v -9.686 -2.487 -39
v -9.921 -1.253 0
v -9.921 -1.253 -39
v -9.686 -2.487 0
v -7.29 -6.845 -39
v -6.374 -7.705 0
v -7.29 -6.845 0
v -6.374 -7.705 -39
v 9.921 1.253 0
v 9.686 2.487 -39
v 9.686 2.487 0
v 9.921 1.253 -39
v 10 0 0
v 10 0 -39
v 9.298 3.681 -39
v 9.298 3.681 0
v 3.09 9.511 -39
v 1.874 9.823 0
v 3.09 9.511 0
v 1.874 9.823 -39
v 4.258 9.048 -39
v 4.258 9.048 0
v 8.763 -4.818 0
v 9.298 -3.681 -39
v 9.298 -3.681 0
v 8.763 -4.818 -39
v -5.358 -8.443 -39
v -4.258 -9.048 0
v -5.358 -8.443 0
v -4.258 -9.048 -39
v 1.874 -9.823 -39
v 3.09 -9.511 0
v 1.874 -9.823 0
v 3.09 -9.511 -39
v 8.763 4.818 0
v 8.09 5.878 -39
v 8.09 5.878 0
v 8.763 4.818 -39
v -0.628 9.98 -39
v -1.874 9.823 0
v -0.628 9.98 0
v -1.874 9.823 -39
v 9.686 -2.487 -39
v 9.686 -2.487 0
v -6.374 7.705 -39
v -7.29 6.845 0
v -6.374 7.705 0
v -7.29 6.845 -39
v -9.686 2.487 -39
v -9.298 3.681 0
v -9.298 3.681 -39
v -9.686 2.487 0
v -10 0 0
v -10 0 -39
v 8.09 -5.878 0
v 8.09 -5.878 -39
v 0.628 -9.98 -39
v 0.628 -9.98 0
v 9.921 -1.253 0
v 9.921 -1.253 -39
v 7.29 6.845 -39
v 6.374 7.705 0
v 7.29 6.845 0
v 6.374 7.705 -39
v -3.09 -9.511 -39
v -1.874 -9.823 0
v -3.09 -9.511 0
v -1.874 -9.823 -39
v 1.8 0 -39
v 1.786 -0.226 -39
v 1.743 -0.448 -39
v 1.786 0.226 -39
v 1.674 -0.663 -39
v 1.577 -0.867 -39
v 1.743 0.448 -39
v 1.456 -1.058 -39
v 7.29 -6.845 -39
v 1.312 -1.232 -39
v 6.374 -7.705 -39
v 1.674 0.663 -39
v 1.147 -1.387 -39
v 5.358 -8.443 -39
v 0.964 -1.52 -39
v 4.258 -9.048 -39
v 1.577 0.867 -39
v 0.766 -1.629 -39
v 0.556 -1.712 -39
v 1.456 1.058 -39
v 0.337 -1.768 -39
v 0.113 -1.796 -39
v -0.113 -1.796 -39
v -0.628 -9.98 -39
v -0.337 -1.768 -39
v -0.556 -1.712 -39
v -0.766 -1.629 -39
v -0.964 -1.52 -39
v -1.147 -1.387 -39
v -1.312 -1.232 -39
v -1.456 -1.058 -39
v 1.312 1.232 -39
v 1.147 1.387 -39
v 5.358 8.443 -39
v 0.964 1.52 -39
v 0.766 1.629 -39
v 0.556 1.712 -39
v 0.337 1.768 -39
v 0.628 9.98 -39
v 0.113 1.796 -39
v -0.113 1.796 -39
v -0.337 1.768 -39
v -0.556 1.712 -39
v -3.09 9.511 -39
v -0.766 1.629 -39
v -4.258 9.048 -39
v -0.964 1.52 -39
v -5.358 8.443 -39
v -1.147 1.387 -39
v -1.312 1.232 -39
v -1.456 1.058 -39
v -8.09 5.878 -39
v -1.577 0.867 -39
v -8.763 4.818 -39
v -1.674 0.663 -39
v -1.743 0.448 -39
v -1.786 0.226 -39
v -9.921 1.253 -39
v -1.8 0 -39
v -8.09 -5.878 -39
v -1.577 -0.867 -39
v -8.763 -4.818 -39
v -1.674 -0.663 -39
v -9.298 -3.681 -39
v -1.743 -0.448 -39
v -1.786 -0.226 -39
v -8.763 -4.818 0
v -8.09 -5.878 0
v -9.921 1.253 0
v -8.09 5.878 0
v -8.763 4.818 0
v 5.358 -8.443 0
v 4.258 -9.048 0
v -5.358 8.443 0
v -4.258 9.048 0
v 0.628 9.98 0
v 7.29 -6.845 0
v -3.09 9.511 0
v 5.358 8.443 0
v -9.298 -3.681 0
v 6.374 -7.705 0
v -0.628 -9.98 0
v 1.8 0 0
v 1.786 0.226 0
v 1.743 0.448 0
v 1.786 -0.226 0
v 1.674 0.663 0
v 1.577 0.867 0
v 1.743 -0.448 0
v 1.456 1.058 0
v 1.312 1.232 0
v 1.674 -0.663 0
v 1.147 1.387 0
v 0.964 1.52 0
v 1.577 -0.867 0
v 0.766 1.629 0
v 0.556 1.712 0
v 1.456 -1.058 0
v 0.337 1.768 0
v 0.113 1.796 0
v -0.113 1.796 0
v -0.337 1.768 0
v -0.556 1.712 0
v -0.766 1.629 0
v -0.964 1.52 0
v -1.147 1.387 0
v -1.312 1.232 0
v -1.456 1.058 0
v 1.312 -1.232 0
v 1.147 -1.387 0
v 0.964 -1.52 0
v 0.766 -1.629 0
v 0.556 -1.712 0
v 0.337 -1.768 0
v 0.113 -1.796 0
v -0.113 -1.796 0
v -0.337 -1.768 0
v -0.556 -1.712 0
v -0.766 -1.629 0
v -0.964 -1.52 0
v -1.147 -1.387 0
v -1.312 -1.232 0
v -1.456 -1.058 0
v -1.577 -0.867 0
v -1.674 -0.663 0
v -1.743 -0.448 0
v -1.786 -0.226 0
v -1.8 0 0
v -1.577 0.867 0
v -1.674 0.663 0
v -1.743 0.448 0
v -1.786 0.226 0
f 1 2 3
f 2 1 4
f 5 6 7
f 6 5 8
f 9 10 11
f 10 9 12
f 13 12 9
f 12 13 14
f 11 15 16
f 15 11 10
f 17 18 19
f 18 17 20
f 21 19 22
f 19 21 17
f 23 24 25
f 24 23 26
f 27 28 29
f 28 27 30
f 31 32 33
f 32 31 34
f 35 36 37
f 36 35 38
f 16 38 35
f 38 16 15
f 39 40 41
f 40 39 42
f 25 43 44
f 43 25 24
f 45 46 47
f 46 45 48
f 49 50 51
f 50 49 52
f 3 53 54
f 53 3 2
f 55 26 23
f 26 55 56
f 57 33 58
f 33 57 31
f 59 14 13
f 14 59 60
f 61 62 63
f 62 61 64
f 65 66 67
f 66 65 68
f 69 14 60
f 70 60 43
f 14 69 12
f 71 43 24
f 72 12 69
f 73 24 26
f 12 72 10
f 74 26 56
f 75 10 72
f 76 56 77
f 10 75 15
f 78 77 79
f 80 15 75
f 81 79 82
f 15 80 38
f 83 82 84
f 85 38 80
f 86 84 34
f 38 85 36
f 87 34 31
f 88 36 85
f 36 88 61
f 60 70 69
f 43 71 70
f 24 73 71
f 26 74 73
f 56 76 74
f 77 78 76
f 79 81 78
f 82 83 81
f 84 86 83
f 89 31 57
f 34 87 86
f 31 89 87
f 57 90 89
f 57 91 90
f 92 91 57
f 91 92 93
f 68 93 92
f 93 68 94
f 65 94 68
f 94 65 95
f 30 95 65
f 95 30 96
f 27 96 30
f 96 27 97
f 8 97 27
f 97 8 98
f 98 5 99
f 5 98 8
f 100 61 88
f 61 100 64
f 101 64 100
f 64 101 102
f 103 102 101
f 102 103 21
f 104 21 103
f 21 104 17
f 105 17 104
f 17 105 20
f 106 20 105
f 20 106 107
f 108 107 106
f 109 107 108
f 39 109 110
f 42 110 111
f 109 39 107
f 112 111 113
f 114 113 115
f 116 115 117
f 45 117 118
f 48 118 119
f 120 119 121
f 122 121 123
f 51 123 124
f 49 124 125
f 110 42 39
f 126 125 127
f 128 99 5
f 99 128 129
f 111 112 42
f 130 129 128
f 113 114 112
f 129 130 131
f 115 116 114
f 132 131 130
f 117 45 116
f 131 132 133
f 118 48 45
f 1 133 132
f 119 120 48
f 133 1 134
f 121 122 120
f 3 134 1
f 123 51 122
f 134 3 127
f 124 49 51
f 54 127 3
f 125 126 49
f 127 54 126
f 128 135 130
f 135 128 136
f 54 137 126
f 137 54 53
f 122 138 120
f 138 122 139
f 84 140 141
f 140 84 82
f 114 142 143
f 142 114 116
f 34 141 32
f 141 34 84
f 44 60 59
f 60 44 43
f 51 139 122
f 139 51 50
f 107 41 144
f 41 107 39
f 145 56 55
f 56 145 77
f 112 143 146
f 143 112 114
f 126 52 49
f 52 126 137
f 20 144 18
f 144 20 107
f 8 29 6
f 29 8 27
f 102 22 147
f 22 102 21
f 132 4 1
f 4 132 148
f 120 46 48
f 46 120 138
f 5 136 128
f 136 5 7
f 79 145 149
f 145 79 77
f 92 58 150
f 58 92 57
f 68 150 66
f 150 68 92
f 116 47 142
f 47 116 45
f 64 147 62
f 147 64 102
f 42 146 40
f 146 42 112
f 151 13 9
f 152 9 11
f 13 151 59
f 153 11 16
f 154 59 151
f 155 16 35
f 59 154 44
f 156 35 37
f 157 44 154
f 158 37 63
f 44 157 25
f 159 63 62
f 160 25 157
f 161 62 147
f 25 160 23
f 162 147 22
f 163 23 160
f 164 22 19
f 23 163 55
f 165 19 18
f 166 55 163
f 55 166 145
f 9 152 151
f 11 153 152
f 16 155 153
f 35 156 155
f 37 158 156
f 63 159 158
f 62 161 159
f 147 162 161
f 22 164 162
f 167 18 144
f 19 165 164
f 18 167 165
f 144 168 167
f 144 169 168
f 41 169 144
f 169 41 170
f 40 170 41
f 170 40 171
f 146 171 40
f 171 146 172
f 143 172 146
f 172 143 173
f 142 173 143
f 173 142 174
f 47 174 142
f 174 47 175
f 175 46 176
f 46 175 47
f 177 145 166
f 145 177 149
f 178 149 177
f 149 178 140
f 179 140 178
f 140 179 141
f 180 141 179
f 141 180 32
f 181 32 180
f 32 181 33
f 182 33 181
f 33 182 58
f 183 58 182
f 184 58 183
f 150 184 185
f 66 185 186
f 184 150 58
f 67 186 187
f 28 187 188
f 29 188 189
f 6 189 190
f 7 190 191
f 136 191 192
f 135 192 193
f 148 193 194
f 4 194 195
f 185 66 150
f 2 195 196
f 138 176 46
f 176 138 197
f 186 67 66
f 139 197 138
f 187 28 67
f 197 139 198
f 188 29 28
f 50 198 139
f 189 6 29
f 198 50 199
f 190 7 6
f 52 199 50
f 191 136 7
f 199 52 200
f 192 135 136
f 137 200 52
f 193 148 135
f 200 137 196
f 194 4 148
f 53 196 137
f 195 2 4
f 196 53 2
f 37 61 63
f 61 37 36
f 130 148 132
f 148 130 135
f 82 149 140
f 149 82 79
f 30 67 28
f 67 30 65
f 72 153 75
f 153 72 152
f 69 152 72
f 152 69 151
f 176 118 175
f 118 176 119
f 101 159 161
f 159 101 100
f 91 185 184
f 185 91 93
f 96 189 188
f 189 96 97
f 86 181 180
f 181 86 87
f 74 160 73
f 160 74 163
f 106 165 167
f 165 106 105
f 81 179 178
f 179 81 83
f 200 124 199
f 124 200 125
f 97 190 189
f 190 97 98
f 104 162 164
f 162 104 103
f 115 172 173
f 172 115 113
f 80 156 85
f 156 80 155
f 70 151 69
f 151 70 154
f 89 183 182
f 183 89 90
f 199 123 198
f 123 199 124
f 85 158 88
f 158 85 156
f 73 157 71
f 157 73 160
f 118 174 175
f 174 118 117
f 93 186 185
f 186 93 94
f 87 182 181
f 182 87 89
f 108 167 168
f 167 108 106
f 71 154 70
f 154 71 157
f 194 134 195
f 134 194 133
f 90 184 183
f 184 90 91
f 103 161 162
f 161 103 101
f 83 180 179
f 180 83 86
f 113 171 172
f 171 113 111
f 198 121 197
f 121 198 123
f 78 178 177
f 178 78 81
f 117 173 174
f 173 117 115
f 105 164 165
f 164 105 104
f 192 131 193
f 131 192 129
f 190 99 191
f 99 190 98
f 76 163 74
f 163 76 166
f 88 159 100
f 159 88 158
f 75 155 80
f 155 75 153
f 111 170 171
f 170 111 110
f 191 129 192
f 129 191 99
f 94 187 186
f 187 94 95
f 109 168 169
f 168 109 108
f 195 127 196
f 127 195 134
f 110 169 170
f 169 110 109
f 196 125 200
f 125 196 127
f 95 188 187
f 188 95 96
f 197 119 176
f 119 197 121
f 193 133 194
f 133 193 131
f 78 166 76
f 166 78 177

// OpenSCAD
$fn = 50;


difference() {
	union() {
		translate(v = [0, 0, -39.0000000000]) {
			cylinder(h = 39, r = 10.0000000000);
		}
		cylinder(h = 0, r = 16.0000000000);
	}
	union() {
		#translate(v = [0, 0, -39]) {
			cylinder(h = 39, r = 1.8000000000);
		}
	}
}
